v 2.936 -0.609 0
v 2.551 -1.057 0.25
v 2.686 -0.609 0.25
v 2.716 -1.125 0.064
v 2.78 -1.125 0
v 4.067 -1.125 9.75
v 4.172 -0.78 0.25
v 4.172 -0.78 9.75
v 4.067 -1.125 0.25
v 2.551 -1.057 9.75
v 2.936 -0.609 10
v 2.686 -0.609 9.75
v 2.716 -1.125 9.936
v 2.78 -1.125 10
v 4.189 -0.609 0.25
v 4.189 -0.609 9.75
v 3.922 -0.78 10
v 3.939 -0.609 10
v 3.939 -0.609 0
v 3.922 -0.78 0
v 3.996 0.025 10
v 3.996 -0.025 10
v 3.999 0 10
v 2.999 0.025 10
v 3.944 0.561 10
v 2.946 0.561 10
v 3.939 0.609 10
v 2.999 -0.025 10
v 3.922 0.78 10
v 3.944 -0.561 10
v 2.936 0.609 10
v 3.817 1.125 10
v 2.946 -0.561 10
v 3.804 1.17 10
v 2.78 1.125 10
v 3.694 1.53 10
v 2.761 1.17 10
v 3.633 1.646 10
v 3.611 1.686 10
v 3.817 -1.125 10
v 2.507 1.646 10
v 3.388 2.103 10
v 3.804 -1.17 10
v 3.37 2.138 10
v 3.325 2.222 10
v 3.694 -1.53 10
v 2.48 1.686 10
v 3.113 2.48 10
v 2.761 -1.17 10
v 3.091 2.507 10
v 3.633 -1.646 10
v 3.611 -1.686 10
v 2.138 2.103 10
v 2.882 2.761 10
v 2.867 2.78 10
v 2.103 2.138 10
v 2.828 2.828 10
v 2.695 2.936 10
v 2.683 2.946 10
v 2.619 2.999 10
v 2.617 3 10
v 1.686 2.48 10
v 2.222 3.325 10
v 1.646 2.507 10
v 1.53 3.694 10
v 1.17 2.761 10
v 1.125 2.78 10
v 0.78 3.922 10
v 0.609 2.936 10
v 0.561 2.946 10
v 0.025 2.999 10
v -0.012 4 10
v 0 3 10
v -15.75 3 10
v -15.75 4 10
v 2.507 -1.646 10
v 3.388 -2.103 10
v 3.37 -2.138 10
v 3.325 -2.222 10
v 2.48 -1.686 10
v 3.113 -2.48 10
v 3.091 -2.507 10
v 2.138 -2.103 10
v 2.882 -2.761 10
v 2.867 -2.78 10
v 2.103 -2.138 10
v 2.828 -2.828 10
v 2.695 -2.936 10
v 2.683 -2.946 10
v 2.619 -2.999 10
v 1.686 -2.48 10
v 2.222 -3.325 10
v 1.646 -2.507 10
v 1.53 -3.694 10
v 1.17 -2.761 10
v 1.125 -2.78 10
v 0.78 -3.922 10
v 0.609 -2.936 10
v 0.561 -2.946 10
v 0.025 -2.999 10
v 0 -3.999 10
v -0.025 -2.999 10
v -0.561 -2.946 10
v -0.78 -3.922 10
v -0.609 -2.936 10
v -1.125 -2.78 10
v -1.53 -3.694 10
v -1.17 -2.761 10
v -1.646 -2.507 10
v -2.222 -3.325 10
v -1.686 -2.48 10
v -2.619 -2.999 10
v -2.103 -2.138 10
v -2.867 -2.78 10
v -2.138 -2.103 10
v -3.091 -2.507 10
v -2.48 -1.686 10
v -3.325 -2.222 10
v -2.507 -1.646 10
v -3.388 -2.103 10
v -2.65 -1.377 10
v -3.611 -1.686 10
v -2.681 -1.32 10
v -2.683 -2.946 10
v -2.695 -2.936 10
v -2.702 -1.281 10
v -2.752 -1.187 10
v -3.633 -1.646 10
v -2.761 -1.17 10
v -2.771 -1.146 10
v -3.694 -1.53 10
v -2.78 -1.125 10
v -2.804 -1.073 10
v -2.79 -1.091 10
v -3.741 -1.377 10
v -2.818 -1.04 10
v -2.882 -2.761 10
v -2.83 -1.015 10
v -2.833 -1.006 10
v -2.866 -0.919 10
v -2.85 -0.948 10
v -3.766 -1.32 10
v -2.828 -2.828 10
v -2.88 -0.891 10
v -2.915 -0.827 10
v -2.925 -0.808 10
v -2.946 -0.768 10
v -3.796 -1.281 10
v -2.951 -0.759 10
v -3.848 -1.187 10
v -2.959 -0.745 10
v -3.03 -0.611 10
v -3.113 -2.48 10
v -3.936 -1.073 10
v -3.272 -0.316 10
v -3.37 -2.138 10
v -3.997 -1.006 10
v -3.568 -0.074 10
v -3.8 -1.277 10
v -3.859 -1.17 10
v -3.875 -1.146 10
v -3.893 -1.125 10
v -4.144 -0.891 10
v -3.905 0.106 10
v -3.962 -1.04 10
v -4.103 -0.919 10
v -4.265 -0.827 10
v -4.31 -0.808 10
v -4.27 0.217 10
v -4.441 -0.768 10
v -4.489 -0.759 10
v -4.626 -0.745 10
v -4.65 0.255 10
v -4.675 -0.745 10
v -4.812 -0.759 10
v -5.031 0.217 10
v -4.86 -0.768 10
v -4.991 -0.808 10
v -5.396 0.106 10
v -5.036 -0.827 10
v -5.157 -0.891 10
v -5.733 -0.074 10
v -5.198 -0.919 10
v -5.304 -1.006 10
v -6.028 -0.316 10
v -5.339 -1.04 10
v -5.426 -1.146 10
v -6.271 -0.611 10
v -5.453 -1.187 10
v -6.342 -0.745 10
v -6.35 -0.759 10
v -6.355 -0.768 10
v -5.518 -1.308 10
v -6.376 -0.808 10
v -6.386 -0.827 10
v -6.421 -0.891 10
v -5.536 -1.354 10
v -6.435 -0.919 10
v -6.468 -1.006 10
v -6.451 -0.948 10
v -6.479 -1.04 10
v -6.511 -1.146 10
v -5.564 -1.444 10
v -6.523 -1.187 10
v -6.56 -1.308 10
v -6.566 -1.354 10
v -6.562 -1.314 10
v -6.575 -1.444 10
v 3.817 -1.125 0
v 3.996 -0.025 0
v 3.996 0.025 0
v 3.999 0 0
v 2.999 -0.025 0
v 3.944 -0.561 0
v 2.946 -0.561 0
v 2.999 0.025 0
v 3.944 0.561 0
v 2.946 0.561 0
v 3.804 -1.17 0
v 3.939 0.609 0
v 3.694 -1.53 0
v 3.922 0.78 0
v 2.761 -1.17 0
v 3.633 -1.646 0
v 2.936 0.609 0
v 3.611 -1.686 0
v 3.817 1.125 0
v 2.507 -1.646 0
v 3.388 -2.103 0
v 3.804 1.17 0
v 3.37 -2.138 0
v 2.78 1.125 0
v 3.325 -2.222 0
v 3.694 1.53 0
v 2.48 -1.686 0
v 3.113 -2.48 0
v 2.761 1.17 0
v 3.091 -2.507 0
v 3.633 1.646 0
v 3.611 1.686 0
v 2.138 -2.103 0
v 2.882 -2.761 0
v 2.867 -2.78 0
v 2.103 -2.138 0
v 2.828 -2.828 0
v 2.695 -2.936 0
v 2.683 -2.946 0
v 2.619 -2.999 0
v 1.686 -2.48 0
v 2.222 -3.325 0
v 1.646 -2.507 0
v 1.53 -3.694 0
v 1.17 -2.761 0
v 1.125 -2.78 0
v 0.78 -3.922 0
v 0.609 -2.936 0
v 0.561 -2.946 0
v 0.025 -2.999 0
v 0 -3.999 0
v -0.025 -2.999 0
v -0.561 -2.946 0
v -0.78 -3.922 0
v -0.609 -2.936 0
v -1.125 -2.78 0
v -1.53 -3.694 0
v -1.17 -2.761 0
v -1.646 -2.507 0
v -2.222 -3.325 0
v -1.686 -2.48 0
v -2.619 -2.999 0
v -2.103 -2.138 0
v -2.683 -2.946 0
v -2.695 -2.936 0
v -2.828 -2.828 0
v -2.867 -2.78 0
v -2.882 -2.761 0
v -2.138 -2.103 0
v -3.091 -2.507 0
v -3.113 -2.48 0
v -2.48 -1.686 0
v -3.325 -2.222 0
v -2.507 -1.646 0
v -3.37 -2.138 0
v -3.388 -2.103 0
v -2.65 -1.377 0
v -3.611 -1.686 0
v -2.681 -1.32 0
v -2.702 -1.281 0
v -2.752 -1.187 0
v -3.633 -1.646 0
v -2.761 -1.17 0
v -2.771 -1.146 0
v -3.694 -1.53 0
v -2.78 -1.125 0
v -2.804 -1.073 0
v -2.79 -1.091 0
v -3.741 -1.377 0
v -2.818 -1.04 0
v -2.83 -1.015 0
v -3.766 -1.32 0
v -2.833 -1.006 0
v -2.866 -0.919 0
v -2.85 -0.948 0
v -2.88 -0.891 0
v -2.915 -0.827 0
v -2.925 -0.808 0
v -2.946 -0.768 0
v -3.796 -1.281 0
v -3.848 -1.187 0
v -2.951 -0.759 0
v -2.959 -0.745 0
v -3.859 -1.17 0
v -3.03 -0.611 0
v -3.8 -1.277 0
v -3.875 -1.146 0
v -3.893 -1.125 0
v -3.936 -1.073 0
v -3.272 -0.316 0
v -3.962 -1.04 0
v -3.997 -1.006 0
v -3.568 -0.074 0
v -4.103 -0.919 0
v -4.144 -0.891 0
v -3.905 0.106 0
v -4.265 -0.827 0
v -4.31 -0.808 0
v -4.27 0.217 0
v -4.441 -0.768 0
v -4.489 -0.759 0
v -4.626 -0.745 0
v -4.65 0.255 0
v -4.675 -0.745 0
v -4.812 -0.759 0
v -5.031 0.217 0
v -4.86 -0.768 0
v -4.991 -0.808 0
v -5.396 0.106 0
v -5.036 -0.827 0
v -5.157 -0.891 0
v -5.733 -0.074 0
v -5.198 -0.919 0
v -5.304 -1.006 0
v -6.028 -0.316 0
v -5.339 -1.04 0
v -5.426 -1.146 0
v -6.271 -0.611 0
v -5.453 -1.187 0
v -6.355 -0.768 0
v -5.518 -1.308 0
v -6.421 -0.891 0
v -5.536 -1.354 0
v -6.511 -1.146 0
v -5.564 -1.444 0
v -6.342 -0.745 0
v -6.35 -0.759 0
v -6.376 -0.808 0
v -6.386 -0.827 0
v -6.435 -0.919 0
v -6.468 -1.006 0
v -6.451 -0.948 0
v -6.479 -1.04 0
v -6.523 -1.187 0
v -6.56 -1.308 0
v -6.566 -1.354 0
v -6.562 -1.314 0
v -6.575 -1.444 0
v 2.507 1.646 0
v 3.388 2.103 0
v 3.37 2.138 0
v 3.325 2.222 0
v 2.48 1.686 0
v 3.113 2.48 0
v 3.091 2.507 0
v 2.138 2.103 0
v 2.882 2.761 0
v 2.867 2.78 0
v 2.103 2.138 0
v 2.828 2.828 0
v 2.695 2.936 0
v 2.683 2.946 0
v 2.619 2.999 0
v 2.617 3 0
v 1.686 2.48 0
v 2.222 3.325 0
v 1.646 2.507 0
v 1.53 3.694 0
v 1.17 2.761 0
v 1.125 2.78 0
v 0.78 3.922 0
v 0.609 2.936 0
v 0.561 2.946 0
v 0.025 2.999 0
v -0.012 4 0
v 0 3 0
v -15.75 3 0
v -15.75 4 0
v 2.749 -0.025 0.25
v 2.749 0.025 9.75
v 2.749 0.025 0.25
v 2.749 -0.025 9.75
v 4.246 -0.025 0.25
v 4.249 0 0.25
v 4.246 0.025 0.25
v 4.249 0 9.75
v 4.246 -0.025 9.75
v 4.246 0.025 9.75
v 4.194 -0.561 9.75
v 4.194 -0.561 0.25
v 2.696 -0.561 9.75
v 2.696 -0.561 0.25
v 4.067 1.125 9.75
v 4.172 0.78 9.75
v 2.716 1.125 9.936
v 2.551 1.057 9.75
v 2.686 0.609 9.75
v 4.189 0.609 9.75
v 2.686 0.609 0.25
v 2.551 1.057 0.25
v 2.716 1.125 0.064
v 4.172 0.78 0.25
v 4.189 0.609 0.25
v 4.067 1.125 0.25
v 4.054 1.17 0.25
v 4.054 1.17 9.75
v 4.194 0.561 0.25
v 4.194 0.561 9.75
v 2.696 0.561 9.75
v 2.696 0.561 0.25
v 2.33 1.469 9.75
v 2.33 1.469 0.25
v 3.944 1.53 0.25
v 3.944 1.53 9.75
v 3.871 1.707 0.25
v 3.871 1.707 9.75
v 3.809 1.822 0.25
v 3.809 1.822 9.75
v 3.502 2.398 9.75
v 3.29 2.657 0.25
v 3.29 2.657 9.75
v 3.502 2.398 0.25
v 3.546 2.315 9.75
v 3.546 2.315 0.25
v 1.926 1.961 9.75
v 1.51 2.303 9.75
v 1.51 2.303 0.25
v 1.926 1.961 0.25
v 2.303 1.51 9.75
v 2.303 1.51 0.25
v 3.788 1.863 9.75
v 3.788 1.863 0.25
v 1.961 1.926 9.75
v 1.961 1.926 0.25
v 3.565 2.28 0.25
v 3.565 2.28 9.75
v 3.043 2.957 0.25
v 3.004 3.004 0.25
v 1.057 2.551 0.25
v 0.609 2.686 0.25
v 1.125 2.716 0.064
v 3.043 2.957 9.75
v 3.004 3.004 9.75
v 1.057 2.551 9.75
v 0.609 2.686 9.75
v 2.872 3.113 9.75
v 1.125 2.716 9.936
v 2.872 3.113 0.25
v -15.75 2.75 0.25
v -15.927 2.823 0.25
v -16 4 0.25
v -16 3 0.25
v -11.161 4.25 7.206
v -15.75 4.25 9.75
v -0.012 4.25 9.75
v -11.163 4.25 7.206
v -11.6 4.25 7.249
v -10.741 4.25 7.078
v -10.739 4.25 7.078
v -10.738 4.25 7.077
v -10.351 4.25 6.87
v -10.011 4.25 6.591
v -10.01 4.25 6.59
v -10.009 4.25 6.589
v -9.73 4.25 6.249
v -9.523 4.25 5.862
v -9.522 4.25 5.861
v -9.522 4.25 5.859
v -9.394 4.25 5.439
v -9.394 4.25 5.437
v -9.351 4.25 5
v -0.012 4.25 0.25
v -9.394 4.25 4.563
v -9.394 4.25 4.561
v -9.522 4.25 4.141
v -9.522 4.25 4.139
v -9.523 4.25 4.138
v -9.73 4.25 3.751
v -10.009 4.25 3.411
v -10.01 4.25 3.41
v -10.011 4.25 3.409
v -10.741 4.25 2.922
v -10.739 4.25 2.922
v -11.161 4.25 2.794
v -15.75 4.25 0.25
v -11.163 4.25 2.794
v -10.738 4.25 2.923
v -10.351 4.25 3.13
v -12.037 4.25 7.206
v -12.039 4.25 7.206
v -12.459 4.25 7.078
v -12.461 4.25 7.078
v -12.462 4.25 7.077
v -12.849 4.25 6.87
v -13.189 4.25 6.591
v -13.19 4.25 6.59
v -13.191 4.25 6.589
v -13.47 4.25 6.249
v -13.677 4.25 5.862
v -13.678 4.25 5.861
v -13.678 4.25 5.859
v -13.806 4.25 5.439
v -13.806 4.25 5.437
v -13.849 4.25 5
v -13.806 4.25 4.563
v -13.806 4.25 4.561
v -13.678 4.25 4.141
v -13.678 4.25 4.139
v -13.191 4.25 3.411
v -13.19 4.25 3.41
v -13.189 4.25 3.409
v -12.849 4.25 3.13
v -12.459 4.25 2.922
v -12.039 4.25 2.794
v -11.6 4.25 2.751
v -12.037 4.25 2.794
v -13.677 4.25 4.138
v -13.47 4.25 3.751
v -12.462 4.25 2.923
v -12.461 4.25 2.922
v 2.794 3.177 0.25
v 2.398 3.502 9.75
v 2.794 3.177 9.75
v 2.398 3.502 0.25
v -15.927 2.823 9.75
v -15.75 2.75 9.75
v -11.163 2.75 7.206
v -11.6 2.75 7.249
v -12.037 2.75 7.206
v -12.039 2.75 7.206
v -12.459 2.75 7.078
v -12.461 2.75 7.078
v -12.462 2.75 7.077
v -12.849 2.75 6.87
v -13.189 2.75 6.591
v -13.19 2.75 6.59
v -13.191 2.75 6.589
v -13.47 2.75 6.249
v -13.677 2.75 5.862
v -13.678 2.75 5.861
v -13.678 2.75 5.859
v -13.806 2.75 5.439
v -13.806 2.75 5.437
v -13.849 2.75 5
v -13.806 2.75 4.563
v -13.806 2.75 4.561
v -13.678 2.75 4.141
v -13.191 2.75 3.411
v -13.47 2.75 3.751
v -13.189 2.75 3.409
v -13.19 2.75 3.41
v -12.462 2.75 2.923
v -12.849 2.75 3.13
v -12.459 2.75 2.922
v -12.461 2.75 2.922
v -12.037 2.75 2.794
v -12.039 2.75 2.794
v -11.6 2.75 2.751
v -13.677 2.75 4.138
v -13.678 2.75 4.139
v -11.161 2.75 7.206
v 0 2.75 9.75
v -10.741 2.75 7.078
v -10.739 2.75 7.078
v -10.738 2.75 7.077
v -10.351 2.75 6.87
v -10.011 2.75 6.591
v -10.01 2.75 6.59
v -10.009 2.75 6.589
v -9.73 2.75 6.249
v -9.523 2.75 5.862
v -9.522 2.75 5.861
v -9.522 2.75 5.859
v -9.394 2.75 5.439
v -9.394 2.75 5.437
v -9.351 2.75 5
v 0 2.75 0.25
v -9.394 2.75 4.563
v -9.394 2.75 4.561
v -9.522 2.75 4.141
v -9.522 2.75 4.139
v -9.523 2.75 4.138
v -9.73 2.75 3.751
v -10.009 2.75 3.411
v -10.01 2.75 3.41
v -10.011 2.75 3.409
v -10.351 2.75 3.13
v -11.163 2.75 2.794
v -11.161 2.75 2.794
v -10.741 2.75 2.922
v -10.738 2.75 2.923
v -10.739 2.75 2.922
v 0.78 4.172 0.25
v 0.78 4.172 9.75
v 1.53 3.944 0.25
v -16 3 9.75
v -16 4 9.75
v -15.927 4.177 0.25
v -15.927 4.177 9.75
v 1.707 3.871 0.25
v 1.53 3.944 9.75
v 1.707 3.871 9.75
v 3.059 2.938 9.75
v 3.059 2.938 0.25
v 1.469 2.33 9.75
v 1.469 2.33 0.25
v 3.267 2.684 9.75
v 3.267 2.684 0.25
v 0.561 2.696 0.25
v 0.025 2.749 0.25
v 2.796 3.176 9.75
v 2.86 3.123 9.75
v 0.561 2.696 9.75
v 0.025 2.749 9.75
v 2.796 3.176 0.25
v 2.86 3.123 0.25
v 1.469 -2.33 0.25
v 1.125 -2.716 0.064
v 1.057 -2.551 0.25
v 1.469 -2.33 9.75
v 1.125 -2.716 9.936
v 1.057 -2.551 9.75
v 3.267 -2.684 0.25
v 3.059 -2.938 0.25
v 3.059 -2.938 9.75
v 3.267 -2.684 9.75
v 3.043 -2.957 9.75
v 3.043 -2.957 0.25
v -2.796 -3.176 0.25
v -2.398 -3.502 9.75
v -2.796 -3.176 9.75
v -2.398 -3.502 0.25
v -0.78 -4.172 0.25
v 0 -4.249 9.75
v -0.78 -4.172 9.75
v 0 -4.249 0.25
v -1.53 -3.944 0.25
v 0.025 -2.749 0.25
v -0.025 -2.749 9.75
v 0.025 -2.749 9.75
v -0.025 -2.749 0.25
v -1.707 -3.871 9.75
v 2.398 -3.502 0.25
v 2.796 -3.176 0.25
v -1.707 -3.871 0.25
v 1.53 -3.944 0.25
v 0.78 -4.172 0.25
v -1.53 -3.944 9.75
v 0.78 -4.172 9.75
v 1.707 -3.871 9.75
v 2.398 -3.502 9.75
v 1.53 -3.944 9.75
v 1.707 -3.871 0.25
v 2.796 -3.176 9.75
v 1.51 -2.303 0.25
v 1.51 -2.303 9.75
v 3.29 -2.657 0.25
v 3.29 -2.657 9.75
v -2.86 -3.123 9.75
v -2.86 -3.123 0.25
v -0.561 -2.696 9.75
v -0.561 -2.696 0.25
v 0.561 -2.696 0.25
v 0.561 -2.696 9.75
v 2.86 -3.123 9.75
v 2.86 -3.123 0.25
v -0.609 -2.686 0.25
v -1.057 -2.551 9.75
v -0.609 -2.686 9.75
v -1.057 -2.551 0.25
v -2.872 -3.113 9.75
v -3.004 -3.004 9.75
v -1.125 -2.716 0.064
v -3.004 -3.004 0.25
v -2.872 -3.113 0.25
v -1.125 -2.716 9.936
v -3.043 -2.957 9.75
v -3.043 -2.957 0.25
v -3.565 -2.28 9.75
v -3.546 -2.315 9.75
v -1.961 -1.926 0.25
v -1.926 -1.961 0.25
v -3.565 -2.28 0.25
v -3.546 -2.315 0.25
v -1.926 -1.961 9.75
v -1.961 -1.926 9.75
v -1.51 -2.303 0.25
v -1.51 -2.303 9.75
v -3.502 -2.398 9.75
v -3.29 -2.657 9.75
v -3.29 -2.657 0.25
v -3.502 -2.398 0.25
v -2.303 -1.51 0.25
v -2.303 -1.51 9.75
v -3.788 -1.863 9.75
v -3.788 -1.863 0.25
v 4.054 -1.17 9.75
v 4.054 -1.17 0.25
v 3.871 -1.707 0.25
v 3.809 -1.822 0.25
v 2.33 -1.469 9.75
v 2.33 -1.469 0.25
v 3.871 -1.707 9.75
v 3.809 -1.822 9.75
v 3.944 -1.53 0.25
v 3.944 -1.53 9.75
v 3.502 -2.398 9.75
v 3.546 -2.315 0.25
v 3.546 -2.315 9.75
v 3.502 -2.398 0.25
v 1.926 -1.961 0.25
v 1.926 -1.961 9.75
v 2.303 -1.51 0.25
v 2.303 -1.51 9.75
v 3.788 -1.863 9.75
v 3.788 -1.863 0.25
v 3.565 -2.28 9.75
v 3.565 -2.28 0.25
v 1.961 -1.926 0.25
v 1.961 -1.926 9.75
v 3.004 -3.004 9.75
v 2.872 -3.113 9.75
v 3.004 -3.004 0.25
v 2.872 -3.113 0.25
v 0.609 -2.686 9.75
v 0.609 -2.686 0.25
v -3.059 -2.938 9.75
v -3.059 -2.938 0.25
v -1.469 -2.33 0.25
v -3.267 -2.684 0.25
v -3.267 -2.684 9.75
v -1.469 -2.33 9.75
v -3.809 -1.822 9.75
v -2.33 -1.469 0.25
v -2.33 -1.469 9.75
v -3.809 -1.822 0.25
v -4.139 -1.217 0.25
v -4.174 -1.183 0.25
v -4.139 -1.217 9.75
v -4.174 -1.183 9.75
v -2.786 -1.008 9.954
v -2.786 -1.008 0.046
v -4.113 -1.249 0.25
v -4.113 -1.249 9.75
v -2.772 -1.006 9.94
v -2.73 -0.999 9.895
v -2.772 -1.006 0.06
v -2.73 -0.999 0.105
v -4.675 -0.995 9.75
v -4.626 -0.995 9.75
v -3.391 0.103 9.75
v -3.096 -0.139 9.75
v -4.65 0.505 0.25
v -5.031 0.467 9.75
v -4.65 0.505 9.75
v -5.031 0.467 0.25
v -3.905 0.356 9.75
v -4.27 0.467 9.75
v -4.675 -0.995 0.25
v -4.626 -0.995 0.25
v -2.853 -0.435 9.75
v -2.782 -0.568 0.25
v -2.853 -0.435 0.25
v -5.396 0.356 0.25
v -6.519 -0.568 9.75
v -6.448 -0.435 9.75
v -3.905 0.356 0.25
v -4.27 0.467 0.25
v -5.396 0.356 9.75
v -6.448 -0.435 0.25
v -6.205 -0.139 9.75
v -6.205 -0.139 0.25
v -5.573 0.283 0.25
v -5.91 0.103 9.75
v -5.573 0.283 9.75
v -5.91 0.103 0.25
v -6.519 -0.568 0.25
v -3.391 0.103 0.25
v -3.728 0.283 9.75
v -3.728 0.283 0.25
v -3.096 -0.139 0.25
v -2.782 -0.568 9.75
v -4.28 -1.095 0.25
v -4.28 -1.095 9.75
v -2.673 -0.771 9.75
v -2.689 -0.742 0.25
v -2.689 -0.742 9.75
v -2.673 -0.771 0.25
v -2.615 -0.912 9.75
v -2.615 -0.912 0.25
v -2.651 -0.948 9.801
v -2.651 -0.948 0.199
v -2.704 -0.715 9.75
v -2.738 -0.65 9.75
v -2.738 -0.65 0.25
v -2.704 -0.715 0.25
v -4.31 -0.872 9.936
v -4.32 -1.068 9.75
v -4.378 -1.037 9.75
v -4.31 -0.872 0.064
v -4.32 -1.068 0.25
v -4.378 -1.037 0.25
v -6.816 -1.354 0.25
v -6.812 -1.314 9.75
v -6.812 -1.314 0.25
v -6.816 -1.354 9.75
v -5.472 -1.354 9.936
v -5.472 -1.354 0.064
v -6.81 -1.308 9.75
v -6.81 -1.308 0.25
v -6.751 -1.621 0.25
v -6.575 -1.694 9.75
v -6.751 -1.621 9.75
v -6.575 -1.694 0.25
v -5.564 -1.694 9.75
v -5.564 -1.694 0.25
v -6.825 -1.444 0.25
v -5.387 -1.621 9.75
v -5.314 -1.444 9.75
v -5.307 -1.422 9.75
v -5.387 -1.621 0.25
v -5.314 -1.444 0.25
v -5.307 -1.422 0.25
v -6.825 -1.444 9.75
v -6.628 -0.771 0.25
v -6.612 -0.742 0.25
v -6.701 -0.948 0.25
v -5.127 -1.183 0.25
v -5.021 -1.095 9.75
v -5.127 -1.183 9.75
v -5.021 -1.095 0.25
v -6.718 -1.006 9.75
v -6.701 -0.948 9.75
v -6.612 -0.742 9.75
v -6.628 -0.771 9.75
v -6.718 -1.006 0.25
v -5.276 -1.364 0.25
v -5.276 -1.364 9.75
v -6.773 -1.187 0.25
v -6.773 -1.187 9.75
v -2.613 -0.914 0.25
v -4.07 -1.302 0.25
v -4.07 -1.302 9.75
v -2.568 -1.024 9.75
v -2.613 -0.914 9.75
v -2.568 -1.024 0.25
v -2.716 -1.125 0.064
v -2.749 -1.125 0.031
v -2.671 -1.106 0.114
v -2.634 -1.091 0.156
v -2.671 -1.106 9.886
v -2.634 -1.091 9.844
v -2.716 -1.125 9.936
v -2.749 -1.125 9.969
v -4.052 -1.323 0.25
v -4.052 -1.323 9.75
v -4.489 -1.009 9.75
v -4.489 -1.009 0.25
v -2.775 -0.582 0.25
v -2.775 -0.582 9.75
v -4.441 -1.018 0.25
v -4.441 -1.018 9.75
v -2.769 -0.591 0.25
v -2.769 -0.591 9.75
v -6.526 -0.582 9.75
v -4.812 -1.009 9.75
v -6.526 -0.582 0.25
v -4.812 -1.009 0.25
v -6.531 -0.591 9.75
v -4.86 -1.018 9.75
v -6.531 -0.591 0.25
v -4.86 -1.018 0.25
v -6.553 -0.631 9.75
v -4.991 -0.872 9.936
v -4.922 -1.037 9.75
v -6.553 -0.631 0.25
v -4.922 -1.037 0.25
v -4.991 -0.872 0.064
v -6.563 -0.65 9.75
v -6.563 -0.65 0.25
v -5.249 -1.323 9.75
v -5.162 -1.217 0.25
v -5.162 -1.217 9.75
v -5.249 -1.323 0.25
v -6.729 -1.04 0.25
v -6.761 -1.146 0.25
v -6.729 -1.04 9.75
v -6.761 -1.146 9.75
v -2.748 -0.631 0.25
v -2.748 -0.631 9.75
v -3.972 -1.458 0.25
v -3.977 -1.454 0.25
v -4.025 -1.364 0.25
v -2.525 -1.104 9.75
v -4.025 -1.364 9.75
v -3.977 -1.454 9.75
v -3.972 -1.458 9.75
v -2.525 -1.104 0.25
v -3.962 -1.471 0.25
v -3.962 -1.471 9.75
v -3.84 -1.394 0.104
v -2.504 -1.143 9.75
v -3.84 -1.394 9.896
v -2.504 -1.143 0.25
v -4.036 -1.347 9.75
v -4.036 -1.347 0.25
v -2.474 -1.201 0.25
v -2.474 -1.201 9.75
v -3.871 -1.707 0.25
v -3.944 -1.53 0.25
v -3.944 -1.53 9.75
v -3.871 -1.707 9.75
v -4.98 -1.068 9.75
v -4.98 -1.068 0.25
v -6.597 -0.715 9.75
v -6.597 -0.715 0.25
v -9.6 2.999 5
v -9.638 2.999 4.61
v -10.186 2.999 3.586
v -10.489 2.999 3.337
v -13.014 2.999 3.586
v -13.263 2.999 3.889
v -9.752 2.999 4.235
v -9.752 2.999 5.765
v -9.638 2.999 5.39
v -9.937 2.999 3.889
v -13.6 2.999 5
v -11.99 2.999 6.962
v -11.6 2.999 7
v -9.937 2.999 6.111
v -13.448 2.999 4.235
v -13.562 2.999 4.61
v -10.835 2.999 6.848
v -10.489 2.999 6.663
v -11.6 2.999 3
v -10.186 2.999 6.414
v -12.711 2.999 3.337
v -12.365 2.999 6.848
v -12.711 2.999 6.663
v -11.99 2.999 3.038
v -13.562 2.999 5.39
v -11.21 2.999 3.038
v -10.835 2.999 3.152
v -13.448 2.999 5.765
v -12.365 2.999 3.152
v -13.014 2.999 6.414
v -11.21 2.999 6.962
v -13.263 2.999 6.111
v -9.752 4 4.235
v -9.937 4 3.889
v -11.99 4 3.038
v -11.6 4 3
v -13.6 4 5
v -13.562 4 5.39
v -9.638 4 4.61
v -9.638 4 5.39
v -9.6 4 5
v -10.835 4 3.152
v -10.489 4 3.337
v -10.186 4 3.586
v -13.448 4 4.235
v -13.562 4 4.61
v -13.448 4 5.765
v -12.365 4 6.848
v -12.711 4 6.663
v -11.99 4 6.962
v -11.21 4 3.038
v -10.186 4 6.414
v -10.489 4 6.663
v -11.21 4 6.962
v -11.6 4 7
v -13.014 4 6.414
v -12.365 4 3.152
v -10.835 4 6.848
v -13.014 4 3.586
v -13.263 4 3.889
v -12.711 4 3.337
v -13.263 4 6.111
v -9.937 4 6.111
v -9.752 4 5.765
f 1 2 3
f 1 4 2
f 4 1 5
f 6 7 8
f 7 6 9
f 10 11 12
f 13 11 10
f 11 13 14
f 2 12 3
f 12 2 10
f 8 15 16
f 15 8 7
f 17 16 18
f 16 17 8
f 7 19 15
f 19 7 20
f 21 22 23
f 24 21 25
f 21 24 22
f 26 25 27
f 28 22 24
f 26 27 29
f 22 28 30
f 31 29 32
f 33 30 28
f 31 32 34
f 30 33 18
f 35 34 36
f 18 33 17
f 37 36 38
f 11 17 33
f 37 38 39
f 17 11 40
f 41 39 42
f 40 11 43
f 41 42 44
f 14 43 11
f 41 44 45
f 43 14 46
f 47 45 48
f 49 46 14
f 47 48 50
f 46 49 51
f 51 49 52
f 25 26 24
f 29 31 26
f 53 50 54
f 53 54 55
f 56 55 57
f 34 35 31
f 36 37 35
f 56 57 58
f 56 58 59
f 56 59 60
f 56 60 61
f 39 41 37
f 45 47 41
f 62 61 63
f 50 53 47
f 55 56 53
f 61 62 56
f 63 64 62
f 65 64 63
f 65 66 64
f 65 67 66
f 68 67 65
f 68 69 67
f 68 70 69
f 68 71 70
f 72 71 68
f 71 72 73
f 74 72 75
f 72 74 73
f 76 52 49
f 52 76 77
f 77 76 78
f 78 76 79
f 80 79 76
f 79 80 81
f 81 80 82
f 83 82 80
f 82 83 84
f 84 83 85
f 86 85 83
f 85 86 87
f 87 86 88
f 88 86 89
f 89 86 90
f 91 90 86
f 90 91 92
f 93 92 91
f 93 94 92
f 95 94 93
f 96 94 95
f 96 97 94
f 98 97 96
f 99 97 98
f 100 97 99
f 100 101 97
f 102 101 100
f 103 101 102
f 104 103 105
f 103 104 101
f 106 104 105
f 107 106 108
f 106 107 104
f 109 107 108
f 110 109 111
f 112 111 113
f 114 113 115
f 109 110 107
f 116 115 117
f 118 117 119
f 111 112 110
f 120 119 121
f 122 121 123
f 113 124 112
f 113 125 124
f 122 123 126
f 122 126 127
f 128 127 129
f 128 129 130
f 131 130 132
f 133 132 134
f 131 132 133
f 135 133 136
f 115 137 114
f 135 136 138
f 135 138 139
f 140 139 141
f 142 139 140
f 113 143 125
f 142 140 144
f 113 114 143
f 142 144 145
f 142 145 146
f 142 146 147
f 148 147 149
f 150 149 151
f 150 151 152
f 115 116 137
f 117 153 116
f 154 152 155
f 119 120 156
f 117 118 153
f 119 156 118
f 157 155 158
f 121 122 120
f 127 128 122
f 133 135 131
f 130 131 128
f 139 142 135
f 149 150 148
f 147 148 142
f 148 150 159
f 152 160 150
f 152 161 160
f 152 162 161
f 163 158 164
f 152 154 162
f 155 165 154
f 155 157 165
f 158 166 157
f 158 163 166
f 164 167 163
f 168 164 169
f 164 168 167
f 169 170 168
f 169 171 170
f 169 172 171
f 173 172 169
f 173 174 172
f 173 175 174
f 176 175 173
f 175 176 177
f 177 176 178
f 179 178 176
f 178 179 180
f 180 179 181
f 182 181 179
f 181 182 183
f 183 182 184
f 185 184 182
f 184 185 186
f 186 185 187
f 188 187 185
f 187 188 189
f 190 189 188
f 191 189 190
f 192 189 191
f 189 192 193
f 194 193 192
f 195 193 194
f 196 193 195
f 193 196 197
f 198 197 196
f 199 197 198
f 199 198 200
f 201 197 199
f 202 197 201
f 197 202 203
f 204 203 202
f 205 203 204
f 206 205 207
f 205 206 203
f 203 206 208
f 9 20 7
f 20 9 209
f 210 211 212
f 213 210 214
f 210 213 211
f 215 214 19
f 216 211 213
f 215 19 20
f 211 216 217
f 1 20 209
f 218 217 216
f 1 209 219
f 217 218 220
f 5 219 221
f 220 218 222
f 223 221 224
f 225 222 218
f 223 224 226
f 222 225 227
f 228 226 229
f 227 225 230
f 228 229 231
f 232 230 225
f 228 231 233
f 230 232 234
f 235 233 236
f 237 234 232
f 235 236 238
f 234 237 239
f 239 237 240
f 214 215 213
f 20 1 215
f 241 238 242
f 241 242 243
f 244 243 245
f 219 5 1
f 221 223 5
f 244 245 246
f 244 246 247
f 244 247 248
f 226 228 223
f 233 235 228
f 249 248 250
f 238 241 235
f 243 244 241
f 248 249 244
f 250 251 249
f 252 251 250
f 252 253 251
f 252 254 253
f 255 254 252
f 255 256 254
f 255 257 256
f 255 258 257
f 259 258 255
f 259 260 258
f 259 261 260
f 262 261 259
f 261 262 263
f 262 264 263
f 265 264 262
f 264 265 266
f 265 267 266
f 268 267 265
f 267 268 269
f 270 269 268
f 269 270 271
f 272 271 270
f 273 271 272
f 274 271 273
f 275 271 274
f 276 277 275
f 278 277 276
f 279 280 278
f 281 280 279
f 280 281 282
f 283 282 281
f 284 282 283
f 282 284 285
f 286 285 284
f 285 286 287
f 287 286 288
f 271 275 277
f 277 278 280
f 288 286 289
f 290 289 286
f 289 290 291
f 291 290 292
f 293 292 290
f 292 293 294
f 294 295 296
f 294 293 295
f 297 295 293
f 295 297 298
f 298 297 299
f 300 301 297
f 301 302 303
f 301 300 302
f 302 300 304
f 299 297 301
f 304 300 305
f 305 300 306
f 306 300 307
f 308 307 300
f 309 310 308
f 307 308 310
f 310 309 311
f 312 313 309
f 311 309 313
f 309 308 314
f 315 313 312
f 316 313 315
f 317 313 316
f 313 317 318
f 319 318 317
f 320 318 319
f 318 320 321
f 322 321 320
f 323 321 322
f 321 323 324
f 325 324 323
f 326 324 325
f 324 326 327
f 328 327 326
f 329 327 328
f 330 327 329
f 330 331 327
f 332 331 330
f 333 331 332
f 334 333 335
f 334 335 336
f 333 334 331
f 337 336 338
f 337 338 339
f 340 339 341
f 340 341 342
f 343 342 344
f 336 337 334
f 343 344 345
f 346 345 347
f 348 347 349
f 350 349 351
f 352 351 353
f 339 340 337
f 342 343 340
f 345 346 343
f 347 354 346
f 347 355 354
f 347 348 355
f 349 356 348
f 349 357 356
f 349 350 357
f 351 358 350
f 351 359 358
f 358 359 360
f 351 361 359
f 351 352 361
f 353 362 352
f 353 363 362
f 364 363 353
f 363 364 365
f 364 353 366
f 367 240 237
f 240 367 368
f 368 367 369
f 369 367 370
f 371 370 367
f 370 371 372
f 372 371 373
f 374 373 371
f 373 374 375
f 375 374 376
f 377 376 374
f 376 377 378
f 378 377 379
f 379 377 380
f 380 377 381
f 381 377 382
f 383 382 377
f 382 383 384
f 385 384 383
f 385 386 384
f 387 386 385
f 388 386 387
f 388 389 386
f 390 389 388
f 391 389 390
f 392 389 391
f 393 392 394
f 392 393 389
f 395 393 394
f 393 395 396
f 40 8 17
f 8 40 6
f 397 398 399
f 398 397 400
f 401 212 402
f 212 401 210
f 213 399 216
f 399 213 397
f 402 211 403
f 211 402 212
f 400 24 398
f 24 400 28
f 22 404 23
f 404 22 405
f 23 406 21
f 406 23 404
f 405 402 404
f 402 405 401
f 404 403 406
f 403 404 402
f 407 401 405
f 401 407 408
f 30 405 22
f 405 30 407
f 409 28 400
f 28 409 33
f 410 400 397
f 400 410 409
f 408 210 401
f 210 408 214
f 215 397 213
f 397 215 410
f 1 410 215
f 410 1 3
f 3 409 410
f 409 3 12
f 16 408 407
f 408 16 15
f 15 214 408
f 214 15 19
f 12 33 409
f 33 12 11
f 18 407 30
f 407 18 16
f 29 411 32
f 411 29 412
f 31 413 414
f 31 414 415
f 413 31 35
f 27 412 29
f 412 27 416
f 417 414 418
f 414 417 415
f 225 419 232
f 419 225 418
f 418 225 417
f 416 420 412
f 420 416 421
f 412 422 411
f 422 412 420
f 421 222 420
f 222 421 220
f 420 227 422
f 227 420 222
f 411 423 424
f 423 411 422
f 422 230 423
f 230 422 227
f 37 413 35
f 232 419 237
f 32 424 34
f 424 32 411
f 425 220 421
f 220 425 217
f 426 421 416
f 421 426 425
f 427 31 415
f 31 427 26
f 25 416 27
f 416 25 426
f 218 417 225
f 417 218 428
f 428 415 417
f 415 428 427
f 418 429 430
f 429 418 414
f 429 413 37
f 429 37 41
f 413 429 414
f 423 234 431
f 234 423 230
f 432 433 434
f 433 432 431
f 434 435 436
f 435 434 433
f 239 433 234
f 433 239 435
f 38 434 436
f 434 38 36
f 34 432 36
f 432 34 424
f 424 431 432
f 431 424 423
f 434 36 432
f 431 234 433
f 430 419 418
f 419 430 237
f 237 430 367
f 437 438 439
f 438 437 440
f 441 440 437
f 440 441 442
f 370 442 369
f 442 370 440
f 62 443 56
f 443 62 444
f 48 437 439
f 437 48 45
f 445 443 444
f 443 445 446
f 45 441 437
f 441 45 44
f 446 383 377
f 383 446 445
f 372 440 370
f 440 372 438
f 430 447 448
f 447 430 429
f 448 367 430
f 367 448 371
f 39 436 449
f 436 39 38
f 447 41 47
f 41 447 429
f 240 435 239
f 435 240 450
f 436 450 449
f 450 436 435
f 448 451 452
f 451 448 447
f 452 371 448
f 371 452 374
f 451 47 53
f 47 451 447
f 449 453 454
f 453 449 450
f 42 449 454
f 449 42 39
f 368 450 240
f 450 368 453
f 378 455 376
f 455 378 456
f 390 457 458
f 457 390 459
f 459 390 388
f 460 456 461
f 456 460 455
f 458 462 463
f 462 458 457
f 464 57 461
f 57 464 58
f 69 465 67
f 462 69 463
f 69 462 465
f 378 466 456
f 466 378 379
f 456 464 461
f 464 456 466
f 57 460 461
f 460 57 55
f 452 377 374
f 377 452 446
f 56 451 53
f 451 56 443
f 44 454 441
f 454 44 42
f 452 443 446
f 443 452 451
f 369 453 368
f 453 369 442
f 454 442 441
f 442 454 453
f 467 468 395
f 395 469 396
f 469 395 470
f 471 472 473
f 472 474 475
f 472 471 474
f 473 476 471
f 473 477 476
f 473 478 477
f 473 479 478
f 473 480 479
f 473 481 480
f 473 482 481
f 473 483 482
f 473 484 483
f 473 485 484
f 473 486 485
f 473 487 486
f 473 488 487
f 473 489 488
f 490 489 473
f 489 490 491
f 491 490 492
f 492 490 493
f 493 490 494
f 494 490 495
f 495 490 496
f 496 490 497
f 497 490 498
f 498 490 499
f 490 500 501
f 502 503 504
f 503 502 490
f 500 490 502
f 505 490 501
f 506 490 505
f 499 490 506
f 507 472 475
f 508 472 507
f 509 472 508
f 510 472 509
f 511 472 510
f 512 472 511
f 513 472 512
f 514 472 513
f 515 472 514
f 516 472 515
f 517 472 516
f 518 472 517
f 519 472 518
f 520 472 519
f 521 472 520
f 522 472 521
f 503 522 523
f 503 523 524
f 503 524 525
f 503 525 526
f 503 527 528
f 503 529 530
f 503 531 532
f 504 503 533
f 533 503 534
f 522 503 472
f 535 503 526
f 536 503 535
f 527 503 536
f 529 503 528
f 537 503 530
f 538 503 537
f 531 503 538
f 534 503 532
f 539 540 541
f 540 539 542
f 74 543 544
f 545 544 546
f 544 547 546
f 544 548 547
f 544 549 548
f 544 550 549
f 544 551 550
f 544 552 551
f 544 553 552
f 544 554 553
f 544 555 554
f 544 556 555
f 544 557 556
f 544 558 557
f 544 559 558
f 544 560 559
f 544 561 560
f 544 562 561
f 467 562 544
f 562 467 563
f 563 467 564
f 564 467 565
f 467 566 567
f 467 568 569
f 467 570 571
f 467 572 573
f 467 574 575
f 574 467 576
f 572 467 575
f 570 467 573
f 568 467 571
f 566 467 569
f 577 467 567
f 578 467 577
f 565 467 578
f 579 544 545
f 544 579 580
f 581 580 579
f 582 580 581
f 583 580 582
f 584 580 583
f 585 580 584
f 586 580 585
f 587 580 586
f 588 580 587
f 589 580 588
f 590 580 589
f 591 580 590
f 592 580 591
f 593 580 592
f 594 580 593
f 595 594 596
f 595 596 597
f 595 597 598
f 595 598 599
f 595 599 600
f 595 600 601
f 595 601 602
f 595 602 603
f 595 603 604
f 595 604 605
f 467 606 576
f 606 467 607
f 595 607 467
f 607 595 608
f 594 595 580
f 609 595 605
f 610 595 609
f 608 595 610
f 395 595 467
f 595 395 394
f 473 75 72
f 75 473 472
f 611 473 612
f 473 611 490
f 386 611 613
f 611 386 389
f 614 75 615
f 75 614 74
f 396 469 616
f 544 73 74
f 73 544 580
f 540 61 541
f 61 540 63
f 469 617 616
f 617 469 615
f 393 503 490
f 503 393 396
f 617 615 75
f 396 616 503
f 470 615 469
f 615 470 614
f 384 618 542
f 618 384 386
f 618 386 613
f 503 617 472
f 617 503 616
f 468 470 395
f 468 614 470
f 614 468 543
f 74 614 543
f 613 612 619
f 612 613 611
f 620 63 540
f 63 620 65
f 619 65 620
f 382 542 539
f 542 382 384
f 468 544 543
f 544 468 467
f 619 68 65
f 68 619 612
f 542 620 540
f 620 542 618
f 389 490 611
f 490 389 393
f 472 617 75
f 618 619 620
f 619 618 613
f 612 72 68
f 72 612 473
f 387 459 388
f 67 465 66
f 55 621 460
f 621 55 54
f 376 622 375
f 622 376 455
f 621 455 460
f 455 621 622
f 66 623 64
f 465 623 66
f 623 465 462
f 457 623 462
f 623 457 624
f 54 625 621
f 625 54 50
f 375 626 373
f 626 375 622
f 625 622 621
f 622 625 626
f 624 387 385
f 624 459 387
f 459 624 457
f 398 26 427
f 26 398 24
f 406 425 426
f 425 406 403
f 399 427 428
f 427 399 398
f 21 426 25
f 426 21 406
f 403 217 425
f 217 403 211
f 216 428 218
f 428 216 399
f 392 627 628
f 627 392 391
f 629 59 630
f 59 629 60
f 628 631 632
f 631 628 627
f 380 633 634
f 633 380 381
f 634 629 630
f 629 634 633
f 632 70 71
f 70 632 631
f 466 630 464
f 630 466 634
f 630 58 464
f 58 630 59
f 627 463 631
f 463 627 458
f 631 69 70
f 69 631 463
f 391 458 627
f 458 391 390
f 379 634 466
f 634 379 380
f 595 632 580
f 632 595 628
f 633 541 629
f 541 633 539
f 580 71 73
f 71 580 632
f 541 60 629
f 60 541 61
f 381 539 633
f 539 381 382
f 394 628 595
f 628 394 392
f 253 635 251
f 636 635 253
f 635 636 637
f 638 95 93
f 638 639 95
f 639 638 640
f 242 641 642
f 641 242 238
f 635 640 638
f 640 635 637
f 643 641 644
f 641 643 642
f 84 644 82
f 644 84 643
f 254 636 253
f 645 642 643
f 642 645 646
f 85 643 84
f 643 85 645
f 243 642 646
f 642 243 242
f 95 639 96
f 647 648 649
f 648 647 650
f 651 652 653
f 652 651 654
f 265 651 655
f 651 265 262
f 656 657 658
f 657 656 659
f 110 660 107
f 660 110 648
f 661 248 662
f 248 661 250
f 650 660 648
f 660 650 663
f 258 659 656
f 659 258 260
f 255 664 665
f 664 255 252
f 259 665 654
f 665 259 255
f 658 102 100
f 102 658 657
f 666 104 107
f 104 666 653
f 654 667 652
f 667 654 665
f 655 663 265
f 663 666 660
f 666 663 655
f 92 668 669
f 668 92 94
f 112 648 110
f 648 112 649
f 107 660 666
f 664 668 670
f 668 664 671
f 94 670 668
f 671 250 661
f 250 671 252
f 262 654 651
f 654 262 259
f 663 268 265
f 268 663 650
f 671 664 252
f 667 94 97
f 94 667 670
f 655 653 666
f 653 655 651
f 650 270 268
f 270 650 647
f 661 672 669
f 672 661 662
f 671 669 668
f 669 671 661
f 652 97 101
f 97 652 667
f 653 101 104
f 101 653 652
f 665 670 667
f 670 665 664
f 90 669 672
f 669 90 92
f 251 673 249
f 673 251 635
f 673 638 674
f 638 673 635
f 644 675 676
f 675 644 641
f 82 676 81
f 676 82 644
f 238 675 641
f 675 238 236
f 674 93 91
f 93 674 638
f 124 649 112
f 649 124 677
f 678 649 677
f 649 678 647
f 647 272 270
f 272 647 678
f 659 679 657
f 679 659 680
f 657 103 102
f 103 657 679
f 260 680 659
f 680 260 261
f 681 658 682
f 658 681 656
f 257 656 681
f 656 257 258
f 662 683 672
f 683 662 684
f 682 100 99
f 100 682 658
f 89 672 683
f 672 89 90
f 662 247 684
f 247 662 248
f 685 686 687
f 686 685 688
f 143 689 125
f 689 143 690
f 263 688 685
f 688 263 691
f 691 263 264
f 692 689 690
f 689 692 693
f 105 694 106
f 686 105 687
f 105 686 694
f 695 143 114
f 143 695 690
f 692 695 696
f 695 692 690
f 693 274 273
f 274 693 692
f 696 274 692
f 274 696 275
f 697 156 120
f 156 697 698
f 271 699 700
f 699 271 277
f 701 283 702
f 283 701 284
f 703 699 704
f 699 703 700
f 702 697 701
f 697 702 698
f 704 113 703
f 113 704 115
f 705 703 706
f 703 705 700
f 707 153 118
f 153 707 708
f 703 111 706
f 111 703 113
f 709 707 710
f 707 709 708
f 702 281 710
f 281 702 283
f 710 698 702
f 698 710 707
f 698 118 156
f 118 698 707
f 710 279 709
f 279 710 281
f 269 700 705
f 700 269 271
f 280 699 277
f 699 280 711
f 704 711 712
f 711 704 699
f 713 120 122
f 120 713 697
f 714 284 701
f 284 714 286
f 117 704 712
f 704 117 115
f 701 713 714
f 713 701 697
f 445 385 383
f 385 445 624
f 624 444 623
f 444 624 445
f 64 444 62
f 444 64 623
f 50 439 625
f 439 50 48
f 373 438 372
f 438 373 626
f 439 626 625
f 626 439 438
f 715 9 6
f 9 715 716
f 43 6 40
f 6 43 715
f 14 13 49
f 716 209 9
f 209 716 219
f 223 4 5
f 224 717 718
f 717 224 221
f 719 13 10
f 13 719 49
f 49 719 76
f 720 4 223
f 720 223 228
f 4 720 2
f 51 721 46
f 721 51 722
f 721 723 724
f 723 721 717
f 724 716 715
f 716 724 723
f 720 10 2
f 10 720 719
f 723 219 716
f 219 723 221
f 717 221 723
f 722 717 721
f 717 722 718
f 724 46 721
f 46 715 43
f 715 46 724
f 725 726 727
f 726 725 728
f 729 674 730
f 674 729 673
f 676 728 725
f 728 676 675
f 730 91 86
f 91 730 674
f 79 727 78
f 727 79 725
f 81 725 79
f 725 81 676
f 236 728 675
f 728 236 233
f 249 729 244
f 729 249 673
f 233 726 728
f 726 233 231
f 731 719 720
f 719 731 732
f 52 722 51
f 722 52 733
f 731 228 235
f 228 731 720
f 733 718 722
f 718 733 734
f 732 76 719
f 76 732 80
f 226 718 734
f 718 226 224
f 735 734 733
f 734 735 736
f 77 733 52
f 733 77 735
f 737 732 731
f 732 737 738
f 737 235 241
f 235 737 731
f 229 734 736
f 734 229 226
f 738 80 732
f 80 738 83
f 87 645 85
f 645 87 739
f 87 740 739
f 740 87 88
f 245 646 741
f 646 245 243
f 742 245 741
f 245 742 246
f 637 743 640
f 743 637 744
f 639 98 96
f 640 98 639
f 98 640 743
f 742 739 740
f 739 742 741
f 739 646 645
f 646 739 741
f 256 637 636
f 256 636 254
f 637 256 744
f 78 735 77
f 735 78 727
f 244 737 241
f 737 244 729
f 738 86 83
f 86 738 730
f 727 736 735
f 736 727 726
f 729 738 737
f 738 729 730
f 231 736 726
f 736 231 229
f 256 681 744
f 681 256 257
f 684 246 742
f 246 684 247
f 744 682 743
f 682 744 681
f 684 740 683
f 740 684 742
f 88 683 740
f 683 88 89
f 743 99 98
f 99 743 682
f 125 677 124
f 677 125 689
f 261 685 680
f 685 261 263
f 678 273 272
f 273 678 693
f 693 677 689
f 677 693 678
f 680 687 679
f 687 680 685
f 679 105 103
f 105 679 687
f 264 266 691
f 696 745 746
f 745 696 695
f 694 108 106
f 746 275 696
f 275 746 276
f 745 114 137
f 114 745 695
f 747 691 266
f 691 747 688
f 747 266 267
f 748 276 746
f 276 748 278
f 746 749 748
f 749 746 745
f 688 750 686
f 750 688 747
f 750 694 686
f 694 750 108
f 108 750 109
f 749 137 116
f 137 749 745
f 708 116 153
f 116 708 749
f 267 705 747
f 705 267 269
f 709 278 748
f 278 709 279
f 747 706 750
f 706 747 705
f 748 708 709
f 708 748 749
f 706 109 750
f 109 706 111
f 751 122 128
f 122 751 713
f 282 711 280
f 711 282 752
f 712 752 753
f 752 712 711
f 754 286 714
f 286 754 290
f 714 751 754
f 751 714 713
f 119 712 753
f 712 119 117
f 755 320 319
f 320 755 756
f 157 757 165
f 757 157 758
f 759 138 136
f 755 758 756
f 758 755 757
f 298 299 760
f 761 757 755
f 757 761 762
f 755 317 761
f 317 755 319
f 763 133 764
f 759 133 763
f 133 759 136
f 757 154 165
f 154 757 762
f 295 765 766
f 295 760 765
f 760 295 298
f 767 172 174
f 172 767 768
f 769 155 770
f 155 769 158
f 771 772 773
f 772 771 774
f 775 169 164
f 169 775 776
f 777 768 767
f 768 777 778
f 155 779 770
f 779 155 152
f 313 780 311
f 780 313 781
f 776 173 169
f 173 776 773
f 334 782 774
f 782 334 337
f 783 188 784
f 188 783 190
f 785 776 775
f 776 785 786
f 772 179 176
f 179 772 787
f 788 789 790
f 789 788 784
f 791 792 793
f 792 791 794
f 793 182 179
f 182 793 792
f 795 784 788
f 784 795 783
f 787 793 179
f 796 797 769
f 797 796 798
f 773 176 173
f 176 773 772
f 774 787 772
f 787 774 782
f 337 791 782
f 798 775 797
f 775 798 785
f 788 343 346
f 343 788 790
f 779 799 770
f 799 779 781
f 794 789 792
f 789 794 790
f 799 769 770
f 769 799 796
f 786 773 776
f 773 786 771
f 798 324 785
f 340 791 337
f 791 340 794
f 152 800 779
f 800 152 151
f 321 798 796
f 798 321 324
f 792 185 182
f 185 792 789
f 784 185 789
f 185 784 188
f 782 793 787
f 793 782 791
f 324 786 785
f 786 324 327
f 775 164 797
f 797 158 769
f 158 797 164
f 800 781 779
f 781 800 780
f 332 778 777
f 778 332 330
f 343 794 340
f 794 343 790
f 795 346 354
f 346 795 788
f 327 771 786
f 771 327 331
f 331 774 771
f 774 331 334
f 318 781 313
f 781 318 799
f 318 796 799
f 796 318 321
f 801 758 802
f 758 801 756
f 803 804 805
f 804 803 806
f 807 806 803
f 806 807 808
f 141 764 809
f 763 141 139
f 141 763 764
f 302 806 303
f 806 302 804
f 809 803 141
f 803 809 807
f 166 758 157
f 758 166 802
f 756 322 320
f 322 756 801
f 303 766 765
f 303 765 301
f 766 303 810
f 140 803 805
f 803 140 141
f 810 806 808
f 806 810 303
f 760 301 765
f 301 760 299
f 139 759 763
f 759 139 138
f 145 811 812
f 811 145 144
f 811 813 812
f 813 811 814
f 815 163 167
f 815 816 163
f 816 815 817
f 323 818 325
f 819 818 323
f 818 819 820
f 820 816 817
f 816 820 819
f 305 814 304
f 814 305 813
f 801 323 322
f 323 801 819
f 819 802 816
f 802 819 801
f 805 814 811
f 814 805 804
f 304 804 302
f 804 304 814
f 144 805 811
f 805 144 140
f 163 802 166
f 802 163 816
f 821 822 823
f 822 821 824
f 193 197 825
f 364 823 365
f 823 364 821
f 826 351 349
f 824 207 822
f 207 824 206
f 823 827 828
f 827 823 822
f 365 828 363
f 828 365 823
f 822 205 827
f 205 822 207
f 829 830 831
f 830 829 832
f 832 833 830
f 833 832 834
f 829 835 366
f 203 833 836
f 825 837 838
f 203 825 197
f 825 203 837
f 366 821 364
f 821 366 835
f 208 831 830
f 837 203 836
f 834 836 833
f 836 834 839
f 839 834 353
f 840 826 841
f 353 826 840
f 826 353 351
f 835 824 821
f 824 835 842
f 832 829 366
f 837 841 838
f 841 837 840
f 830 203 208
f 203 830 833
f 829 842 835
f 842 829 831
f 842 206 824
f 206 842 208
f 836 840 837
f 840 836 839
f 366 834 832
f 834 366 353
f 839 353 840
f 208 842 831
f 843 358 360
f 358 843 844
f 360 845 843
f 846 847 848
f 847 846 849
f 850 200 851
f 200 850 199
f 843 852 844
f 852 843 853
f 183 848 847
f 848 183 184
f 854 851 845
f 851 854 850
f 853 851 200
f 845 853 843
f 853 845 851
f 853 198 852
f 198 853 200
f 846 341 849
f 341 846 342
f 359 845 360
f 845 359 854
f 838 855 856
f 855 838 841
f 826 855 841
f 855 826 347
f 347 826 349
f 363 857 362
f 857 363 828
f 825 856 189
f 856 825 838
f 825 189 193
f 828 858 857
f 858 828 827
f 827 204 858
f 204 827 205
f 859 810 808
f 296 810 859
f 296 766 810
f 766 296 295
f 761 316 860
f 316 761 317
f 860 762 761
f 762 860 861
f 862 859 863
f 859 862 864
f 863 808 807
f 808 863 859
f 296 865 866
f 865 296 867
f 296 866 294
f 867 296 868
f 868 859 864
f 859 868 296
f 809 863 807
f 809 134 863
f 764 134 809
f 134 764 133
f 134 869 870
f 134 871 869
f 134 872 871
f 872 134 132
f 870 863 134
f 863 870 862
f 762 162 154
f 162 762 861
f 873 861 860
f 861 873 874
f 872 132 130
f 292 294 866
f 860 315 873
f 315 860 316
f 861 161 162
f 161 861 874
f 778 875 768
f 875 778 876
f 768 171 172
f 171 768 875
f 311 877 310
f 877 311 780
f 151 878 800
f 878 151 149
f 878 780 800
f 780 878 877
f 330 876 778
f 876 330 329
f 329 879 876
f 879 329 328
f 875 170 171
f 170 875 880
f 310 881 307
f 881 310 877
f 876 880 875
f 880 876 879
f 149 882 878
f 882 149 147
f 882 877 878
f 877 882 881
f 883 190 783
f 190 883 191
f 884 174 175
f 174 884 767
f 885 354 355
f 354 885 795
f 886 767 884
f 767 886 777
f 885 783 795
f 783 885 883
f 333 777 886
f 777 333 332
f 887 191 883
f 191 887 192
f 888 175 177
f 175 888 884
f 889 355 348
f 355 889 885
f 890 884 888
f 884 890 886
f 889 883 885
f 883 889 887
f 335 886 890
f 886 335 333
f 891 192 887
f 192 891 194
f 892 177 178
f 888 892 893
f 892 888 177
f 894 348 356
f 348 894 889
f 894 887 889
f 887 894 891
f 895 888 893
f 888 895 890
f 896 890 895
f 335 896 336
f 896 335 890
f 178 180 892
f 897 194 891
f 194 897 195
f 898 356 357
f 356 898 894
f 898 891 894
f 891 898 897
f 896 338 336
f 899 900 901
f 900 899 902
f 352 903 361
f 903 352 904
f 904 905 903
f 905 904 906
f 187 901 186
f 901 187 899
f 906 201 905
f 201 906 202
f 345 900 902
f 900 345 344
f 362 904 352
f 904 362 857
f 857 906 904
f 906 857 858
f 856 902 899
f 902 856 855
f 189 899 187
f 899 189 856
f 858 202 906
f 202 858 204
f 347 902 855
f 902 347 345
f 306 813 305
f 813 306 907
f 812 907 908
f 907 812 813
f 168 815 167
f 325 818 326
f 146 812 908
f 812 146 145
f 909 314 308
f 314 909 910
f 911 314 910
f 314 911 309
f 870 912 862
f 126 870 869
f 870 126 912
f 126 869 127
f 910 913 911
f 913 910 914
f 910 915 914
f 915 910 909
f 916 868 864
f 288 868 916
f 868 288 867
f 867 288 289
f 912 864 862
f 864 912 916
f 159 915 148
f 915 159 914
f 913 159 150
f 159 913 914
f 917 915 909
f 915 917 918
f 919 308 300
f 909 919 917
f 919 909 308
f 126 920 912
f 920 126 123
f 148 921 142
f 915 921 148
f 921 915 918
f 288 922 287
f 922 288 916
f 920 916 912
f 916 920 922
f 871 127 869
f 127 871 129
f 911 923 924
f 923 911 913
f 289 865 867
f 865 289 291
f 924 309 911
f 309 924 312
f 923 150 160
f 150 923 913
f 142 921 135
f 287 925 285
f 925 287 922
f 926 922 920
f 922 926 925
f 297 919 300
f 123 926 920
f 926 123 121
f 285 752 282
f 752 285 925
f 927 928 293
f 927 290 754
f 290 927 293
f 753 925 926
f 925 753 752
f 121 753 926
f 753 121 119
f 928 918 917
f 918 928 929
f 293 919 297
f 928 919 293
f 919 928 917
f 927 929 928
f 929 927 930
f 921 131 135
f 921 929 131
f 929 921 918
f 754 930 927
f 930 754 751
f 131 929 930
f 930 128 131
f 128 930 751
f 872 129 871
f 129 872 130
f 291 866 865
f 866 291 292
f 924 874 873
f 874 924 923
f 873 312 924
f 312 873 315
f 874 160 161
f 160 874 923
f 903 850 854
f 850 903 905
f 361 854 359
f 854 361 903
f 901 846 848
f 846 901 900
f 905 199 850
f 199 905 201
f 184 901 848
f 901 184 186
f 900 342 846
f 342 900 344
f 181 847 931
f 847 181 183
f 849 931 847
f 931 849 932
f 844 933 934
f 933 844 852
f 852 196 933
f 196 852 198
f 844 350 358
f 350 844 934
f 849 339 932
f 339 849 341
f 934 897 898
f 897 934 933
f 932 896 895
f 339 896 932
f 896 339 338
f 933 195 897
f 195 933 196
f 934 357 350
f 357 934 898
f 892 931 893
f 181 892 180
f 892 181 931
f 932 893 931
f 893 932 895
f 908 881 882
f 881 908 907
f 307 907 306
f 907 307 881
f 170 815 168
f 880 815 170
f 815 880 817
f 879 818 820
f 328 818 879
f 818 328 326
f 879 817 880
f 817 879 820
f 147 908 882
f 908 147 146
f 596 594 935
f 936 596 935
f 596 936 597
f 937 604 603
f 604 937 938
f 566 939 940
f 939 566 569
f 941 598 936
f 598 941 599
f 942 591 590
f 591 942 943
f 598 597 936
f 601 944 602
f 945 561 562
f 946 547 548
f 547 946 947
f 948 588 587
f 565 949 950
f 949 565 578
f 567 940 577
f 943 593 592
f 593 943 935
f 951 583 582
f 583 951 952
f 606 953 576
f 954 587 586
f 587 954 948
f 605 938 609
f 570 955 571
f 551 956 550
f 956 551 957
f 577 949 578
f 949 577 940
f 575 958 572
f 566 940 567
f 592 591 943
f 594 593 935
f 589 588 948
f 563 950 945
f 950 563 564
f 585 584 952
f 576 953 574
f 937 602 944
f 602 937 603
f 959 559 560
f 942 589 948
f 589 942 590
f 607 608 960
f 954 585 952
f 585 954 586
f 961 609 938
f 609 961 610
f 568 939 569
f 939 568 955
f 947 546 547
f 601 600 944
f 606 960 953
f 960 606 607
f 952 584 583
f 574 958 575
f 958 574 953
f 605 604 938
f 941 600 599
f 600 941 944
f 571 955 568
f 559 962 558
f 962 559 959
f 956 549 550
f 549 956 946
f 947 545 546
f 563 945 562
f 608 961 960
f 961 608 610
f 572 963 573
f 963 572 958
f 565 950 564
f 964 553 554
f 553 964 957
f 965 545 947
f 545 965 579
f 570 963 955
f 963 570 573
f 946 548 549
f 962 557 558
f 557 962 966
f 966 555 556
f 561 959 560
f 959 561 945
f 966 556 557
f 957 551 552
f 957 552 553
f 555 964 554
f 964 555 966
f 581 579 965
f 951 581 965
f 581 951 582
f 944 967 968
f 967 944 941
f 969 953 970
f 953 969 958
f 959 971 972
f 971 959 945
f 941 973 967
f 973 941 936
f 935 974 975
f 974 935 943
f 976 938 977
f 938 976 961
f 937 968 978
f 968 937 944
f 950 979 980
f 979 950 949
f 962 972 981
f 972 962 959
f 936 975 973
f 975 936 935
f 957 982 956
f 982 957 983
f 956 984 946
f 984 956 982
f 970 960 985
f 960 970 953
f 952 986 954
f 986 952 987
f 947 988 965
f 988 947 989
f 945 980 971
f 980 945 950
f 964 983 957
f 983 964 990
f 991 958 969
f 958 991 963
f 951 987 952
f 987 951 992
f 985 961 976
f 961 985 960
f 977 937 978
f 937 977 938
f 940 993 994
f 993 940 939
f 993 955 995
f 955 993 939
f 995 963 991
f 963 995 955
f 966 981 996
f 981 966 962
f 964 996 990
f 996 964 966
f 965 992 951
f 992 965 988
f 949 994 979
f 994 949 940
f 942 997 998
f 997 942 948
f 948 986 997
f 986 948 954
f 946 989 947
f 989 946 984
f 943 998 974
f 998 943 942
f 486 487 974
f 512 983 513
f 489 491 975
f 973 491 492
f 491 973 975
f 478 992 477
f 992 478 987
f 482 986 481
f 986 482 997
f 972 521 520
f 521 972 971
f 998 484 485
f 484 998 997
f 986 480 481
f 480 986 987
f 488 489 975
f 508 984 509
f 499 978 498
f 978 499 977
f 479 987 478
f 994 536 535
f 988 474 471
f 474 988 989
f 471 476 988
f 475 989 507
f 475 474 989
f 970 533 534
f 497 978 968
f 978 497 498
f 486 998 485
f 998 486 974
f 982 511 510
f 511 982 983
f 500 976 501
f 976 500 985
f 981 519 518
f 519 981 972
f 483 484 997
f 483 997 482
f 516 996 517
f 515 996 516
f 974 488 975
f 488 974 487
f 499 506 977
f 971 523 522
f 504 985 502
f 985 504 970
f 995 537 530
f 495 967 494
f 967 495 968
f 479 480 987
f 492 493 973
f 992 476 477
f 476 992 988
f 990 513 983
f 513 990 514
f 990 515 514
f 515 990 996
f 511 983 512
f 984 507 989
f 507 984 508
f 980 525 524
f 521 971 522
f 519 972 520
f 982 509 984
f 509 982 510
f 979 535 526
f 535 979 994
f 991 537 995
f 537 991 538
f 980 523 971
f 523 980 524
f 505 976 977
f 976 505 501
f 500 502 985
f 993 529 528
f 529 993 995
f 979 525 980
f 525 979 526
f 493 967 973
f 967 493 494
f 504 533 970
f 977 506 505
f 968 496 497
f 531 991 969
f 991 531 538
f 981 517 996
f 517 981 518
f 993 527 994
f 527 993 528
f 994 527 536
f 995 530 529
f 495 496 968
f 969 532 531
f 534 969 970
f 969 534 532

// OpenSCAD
part = "flap"; // [rod,flap,demo]

thickness = 1.5; // [0.2:0.1:10]
height = 10;
cable_diameter = 5.5; // [2:0.5:100]
opening_angle = 110; // [0:179]
opening_rounding_radius = 2.2; // [0:0.2:50]
rod_diameter = 7.5; // [2:0.5:100]
flap_length = 16; // [0:100]
screw_diameter = 4; // [0:0.5:20]
// Position of the screw hole from cable center
screw_position = 11.6; // [0:100]
// Hint: set this to 0 to get a faster preview
chamfer = 0.25; // [0:0.05:1]

/* [Hidden] */

$fn=32;

module ring(dia,thickness,angle)
{
    difference() {
        circle(d=dia+2*thickness);
        circle(d=dia);
        l=dia/2+thickness+1;
        if (angle > 179) {
            polygon([[0,0],[0,l],[-l,l],[-l,0],[-l,-l],[l,-l],[l,l*tan(angle-90)]]);
        } else {
            polygon([[0,0],[0,l],[-l,l],[-l,0],[-l,-l*tan(angle-90)]]);
        }
    }
}

module flap_clip_section()
{
    ring(cable_diameter,thickness,opening_angle);

    pos = [-((cable_diameter/2+opening_rounding_radius)*sin(opening_angle)-.001),
        (cable_diameter/2+opening_rounding_radius)*cos(opening_angle)-.001];
    translate(pos)
        rotate(90)
            ring(2*(opening_rounding_radius-thickness),thickness,opening_angle+90);

    translate([-flap_length,cable_diameter/2])
        square([flap_length,thickness]);
}

module rod_clip_section()
{
    pos = [-((cable_diameter/2+thickness+rod_diameter/2)*sin(opening_angle)-.001),
        (cable_diameter/2+thickness+rod_diameter/2)*cos(opening_angle)-.001];
    
    ring(cable_diameter,thickness,opening_angle);
    translate([0,cable_diameter/2+opening_rounding_radius])
        rotate(180)
            ring(2*(opening_rounding_radius-thickness),thickness,opening_angle+90);
    translate(pos)
        rotate(180)
            ring(rod_diameter,thickness,opening_angle);
    translate([pos.x,pos.y-rod_diameter/2-opening_rounding_radius])
        ring(2*(opening_rounding_radius-thickness),thickness,opening_angle+90);
}

module chamfer_chisel()
{
    cylinder(r1=chamfer,r2=0,h=chamfer,$fn=8);
    mirror([0,0,1])
        cylinder(r1=chamfer,r2=0,h=chamfer,$fn=8);
}

module part(part)
{
    difference() {
        if (chamfer > 0) {
            minkowski() {
                translate([0,0,chamfer]) {
                    linear_extrude(height-2*chamfer) {
                        offset(-chamfer) {
                            if (part == "flap")
                                flap_clip_section();
                            else
                                rod_clip_section();
                        }
                    }
                }
                chamfer_chisel();            
            }
        } else {
            // Avoid minkowski() for speedup
            linear_extrude(height) {
                if (part == "flap")
                    flap_clip_section();
                else
                    rod_clip_section();
            }
        }

        if (part == "flap") {
            translate([-screw_position,cable_diameter/2,height/2]) {
                rotate([-90]) {
                    union() {
                        translate([0,0,-.001])
                            cylinder(d1=screw_diameter+2*chamfer,d2=screw_diameter,h=chamfer);
                        translate([0,0,-1])
                            cylinder(d=screw_diameter,h=thickness+2);
                        translate([0,0,thickness-chamfer])
                            cylinder(d1=screw_diameter,d2=screw_diameter+2*chamfer,h=chamfer+.001);
                    }
                }
            }
        }
    }
}

module demo()
{
    dist = 5;
    color("steelblue")
        render()
            translate([0,cable_diameter/2+thickness+dist/2])
                part("flap");
    color("darkorange")
        render() 
            translate([0,-max(rod_diameter,cable_diameter)/2-thickness-dist/2,0])
                rotate(-opening_angle/4)
                    part("rod");
}

if (part == "demo") {
    demo();
} else if (part == "rod") {
    rotate(-opening_angle/4)
        part(part);
} else {
    part(part);
}
